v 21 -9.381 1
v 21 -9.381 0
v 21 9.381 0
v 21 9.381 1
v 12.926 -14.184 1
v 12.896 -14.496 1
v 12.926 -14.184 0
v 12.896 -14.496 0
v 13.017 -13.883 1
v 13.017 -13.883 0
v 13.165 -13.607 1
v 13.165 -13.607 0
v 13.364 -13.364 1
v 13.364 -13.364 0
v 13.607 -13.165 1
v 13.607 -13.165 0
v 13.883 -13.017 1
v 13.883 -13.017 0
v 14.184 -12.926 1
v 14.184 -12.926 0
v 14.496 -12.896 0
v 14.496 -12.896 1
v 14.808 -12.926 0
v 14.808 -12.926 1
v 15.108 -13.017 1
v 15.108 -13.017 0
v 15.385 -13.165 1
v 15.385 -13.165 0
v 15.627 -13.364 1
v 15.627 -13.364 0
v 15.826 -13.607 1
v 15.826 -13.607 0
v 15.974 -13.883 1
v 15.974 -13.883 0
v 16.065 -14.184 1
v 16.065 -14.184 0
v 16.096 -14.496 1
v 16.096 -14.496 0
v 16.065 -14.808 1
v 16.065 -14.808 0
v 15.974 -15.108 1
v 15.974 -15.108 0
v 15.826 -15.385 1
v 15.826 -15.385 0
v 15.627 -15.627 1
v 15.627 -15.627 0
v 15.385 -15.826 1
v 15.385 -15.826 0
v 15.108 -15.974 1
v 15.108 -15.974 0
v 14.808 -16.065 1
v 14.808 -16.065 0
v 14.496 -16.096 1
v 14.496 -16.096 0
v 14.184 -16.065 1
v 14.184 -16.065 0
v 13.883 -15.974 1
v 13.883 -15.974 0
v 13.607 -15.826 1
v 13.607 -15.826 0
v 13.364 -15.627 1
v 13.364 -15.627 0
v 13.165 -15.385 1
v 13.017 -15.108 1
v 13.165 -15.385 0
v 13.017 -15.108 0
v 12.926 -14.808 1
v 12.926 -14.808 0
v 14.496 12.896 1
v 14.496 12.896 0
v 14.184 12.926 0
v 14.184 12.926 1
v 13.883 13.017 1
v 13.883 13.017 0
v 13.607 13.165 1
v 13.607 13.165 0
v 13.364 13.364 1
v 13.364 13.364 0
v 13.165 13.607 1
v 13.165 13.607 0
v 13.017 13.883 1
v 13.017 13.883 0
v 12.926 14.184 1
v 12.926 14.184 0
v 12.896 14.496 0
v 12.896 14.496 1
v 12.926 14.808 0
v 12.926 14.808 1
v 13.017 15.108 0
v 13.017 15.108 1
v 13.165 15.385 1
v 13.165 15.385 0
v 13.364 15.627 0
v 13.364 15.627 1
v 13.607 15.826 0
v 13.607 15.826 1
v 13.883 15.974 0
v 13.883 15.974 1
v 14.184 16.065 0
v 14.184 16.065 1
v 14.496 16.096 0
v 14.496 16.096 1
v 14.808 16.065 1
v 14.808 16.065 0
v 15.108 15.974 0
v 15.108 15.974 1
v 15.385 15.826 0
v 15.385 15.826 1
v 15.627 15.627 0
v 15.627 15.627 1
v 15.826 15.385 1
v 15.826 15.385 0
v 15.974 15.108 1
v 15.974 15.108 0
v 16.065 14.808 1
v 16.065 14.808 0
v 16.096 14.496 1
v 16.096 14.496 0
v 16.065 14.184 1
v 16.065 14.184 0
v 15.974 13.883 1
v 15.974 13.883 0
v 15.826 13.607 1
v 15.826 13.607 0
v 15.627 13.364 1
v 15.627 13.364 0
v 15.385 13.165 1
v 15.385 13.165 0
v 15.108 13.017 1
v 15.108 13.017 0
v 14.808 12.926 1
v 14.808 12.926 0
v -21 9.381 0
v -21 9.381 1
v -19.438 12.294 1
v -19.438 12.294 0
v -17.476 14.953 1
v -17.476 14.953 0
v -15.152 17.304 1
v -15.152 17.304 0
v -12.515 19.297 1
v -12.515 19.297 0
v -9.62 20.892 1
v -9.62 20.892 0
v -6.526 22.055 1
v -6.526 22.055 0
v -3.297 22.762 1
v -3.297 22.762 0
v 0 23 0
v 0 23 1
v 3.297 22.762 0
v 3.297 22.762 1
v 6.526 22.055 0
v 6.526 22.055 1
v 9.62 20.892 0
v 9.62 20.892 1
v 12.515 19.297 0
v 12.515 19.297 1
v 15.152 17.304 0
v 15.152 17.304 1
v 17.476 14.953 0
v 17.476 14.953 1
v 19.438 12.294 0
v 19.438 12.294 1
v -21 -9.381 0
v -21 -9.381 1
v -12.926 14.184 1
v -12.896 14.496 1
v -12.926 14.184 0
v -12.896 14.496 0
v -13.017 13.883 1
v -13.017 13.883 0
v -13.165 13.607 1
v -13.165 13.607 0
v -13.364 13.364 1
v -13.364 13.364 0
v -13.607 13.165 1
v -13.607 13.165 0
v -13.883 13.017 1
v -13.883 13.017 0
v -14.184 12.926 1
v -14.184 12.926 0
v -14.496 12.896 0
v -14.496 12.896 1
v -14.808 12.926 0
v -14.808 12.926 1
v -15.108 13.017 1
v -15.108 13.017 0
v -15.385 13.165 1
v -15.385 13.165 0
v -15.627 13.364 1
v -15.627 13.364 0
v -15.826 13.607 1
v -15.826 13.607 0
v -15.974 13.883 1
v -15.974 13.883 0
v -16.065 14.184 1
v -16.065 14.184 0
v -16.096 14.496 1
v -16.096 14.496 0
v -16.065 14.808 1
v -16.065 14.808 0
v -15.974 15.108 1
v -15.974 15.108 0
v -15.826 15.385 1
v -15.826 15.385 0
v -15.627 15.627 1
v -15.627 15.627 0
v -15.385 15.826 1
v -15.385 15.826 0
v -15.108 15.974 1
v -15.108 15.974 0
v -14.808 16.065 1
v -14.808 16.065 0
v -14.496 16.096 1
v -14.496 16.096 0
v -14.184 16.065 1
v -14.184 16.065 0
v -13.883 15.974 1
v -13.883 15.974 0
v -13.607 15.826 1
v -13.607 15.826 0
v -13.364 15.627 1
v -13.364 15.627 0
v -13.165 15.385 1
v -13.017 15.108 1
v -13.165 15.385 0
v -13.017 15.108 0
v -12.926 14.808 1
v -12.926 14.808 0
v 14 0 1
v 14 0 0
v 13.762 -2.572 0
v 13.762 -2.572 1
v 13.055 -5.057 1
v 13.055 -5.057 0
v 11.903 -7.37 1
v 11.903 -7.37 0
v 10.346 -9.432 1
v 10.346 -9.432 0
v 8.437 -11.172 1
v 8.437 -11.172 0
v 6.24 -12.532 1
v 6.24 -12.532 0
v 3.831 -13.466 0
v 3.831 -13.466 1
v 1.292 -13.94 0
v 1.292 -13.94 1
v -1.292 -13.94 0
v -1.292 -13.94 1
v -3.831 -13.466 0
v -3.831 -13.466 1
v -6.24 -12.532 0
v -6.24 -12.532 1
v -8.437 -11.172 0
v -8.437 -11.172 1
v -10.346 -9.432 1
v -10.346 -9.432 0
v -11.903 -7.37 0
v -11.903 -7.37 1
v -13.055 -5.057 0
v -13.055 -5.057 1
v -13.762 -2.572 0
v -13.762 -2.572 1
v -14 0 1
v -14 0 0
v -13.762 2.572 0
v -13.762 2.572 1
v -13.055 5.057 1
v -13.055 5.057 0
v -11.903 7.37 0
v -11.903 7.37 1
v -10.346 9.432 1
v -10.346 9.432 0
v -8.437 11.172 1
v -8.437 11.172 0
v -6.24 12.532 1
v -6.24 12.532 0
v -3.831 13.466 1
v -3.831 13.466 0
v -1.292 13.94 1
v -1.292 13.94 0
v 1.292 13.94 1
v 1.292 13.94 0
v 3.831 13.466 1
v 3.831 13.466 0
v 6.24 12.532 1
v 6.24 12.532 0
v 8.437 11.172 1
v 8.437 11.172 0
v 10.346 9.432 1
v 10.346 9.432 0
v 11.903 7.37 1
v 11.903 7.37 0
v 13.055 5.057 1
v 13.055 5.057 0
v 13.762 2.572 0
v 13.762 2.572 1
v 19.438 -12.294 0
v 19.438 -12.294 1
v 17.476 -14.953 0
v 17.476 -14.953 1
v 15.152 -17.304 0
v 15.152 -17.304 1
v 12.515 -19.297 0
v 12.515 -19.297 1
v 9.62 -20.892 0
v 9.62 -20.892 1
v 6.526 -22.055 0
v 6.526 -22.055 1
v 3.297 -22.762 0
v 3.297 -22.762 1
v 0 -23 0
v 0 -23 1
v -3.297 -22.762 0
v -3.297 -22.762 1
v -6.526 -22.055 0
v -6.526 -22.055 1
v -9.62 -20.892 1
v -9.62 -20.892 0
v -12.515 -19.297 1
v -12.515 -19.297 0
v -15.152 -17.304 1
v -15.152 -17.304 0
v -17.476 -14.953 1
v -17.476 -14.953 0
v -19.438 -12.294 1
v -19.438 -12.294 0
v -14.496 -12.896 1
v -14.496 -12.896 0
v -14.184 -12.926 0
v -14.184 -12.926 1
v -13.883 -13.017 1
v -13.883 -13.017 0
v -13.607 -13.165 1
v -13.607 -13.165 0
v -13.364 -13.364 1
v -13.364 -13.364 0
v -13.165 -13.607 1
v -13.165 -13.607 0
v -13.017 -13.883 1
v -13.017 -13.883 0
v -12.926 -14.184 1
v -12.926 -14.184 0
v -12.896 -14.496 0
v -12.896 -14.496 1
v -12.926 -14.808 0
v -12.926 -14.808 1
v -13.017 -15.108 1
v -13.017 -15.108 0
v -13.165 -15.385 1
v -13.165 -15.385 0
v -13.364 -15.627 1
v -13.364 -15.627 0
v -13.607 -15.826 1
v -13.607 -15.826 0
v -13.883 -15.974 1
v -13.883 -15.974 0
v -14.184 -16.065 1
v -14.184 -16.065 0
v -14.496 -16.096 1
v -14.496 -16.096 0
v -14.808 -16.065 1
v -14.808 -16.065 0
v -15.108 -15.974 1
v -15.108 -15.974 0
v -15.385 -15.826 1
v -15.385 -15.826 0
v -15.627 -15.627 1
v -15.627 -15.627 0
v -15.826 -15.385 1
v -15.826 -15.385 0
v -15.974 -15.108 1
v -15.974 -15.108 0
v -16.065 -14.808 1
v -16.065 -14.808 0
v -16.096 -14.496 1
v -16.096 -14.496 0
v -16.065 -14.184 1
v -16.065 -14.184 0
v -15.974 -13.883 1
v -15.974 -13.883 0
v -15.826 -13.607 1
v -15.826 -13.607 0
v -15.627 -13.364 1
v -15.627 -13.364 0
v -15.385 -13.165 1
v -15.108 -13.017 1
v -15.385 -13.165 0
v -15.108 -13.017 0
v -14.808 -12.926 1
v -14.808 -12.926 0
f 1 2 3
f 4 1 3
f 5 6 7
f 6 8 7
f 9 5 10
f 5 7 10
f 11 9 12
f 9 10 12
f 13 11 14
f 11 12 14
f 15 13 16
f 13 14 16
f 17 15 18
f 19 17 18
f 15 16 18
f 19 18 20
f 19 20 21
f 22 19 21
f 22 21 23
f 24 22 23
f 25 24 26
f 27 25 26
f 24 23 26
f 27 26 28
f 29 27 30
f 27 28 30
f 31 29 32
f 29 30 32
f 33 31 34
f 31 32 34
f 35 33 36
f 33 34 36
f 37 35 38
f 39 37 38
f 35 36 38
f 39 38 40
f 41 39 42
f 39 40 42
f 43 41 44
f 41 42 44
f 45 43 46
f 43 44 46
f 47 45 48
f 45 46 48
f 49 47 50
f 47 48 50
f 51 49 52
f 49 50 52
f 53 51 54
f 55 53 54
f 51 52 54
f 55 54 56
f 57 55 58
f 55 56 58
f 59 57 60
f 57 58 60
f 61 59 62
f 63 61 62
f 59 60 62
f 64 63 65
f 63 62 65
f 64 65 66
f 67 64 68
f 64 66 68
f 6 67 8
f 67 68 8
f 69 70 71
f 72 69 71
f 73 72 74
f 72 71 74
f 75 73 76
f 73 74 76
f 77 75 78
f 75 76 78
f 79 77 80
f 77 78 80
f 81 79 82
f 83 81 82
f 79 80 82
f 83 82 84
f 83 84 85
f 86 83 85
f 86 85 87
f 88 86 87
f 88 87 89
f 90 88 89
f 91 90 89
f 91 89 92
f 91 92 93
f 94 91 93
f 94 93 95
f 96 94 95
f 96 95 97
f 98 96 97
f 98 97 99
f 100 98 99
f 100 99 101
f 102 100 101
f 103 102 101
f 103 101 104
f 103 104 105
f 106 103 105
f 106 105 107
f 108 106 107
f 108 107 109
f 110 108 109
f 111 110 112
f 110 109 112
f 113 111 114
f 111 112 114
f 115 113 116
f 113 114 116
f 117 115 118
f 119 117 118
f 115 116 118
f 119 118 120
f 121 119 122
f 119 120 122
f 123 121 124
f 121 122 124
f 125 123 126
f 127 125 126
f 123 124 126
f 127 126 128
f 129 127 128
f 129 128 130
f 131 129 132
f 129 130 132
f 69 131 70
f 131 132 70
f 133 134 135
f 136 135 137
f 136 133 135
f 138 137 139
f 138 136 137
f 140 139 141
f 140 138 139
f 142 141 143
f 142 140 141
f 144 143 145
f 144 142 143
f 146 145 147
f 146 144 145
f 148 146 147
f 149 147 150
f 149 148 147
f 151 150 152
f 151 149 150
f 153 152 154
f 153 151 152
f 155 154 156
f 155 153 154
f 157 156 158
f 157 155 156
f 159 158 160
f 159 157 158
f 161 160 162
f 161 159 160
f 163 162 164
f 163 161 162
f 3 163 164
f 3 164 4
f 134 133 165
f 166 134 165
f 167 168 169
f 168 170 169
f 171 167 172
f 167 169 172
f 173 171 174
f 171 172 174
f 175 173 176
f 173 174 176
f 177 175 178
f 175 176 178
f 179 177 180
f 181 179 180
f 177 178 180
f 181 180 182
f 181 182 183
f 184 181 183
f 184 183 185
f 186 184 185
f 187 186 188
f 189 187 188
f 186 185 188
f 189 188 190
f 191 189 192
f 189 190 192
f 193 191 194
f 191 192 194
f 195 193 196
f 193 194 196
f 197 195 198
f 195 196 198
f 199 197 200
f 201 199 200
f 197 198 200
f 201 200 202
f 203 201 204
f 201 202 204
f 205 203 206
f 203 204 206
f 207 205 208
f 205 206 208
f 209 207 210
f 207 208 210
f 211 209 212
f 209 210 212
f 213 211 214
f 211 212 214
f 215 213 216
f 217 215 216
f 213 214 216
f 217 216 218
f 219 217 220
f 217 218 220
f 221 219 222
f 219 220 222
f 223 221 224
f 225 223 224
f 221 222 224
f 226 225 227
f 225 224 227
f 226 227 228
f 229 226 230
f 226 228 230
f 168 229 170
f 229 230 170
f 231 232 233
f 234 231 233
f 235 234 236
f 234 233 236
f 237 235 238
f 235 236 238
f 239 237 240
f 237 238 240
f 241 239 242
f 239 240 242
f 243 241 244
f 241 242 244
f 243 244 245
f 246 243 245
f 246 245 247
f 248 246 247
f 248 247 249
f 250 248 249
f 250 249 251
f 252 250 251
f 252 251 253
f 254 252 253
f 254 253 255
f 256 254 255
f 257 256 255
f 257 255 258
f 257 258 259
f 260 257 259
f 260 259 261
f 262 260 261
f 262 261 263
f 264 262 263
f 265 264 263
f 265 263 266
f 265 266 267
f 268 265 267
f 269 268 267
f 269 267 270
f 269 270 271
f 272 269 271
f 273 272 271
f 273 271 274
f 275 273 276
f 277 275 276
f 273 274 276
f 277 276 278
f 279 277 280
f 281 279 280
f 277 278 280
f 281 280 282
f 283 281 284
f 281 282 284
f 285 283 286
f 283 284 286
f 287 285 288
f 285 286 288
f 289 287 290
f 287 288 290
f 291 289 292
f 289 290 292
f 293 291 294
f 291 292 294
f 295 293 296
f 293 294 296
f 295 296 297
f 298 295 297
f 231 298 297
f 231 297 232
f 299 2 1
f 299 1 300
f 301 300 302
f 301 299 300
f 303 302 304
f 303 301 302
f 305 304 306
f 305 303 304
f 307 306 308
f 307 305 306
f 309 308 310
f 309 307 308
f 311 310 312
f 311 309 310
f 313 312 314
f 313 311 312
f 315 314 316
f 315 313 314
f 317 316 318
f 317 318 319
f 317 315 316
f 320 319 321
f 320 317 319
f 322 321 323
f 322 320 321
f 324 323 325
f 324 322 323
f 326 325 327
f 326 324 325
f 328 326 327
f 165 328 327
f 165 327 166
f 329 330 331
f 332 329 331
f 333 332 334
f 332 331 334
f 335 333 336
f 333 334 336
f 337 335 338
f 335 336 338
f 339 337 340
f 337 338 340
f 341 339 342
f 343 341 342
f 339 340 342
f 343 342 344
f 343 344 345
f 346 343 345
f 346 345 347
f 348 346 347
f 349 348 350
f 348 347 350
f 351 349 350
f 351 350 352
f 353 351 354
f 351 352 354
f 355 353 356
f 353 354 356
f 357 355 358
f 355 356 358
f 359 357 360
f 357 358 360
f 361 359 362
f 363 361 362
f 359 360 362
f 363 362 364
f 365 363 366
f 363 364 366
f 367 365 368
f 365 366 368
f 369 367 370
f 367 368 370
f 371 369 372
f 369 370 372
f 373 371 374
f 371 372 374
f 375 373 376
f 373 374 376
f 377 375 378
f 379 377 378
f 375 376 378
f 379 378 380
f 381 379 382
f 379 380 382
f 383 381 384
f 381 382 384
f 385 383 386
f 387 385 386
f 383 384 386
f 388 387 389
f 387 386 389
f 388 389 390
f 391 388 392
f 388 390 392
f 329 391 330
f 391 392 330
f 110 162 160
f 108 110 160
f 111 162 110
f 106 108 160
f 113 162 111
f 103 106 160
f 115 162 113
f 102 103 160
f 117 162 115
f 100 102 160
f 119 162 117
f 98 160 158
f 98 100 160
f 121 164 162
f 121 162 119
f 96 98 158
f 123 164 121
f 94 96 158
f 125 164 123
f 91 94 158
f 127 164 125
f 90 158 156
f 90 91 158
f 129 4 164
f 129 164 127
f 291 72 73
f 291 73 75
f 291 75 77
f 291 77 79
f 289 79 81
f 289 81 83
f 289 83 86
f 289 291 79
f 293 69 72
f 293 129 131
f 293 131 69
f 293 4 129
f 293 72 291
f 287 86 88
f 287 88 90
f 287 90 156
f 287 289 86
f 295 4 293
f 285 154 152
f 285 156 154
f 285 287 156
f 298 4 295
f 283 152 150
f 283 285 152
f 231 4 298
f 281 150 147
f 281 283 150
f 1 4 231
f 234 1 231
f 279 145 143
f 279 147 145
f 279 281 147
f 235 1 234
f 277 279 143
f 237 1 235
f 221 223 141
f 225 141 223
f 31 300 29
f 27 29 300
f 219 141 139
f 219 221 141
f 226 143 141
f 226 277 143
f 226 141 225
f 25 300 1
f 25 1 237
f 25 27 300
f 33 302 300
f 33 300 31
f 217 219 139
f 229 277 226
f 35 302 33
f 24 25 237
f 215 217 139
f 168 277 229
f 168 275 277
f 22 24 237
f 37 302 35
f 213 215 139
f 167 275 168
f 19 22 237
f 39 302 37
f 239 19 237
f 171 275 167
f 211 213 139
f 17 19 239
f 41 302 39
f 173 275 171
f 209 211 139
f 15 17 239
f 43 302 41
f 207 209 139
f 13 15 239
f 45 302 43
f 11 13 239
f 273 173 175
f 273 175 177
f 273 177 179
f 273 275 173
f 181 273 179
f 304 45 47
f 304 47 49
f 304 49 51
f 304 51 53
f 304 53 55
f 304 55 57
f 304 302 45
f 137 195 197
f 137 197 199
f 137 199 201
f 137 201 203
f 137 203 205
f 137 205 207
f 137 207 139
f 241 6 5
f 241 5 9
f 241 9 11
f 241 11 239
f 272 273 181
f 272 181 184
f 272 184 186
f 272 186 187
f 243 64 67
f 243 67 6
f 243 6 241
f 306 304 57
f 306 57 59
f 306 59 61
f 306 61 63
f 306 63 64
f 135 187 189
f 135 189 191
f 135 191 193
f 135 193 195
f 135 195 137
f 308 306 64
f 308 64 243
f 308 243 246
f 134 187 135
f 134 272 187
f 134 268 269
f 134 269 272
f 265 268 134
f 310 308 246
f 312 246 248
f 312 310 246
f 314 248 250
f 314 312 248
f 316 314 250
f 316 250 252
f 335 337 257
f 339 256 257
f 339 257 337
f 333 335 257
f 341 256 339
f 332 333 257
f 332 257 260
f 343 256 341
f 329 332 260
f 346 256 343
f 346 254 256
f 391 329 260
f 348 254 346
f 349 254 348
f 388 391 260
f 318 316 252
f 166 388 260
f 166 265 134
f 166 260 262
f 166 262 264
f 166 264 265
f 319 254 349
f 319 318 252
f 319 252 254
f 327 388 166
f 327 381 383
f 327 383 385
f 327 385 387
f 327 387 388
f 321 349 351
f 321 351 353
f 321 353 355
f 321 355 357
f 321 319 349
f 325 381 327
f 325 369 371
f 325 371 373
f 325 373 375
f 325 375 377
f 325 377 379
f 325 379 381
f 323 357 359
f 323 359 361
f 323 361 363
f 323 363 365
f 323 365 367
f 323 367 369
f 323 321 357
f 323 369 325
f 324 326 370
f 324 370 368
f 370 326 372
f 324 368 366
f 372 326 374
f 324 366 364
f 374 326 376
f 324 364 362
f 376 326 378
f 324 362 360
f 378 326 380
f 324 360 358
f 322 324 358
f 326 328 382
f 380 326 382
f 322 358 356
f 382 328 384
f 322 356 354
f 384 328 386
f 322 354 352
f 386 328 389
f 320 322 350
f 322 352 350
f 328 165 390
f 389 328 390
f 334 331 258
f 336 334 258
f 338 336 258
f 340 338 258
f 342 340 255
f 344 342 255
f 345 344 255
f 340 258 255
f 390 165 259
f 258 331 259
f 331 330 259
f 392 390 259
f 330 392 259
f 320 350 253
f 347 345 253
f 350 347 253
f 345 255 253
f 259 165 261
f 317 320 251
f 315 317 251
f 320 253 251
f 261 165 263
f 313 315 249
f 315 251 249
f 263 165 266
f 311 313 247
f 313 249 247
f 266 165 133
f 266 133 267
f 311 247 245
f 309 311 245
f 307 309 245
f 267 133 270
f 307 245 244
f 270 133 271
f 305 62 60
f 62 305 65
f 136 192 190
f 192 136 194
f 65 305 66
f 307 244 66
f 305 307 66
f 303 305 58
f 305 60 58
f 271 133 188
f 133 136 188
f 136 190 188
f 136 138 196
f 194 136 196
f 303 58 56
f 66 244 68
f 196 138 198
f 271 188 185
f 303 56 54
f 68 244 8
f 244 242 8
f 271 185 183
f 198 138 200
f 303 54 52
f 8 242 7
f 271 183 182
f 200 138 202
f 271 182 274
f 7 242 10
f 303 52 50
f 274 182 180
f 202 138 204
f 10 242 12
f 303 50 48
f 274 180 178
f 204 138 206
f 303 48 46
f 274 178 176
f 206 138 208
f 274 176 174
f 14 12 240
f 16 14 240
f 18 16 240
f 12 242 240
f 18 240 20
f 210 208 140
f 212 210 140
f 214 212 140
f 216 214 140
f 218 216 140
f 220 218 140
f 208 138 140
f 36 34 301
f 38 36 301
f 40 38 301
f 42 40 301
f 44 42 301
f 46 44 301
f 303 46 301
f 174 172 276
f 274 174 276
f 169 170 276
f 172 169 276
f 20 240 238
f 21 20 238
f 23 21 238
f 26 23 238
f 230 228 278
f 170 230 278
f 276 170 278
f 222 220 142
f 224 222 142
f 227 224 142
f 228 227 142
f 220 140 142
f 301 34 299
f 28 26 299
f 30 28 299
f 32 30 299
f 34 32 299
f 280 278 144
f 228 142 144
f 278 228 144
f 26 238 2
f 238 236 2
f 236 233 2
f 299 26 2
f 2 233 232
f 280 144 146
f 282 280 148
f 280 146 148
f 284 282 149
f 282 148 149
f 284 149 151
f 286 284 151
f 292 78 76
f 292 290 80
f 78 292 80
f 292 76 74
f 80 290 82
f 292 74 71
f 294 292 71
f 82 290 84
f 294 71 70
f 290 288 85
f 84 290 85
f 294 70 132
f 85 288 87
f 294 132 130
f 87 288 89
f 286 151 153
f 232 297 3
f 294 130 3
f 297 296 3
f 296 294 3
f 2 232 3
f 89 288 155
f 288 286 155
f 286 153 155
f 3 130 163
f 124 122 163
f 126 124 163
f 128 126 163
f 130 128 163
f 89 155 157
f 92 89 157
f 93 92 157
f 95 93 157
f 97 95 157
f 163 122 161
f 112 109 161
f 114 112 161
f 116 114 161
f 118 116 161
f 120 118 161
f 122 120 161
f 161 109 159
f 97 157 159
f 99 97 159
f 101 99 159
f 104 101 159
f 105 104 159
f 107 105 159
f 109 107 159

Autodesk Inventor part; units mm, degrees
ref_plane "YZ Plane" through (0, 0, 0) normal (1, 0, 0) x (0, 1, 0)
ref_plane "XZ Plane" through (0, 0, 0) normal (0, 1, 0) x (-1, 0, 0)
sketch "Sketch1" plane through (0, 0, 0) normal (0, 0, 1) x (1, 0, 0)
  circle A0 centre (0, 0) radius 14
  circle A1 centre (0, 0) radius 23
  dimension "d0" = 28
  dimension "d1" = 46
extrude "Extrusion1" add sketch "Sketch1" along normal blind 10
sketch "Sketch2" plane through (0, 0, 10) normal (0, 0, 1) x (1, 0, 0)
  line L0 (0, 0) -> (23, 0) construction
  circle A0 centre (0, 0) radius 23 projected
  circle A1 centre (0, 0) radius 20.5 construction
  line L1 (0, 0) -> (14.4957, 14.4957) construction
  dimension "d35" = 41
  dimension "d34" = 45
hole "For-m3-screws" at (14.4957, 14.4957, 10) direction (0, 0, -1) diameter 3.2 end through all counterbore diameter 7 counterbore depth 8.5
fillet "Fillet3" radius 0.5 2 edges at (14.3283, 17.9917, 5.75) (17.9917, 14.3283, 5.75)
pattern_circular "Circular Pattern1" count 4 over 360 about axis through (0, 0, 0) along (0, 0, 1) of "For-m3-screws", "Fillet3"
sketch "Sketch3" plane through (0, 0, 0) normal (0, 1, 0) x (-1, 0, 0)
  line L0 (23, 3.8135) -> (-23, 1)
  line L1 (-23, 1) -> (-23, 11)
  line L2 (23, 10) -> (-27, 10) projected
  line L3 (-23, 11) -> (23, 11)
  line L4 (23, 11) -> (23, 3.8135)
  line L5 (-23, 0) -> (-23, 10) projected
  line L6 (23, 0) -> (23, 10) projected
  line L7 (-14, 0) -> (14, 0) projected
  line L8 (-27, 10) -> (-23, 10) projected
  point P0 (0, 0)
  point P1 (-14.3283, 10)
  point P2 (0, 11)
  point P3 (-17.9917, 10)
  dimension "d14" = 3.5
  dimension "d15" = 1
  dimension "d16" = 1
extrude "Angled-cut" [suppressed]
sketch "Sketch6" plane through (0, 0, 0) normal (0, 1, 0) x (-1, 0, 0)
  line L0 (23, 10) -> (-23, 10)
  line L1 (-23, 10) -> (-23, 1)
  line L2 (-23, 1) -> (23, 1)
  line L3 (23, 1) -> (23, 10)
  line L4 (23, 0) -> (-23, 0) projected
  line L5 (23, 0) -> (23, 10) projected
  line L6 (-23, 0) -> (-23, 10) projected
  point P0 (0, 0)
  point P1 (0, 10)
  dimension "d27" = 1
extrude "Straight-cut" cut sketch "Sketch6" along normal through all both and the other way through all contours L3 L2 L1 L0
sketch "Sketch4" plane through (0, 0, 0) normal (0, 0, 1) x (1, 0, 0)
  line L0 (21, 30) -> (26, 30)
  line L1 (26, 30) -> (26, -30)
  line L2 (26, -30) -> (21, -30)
  line L3 (21, -30) -> (21, 30)
  point P0 (0, 0)
  point P1 (26, 0)
  dimension "d19" = 21
  dimension "d20" = 60
  dimension "d21" = 5
extrude "Extrusion3" cut sketch "Sketch4" along normal blind 10
mirror "Mirror1" about plane through (0, 0, 0) normal (1, 0, 0) of "Extrusion3"
ref_plane "Work Plane1" through (22, -12.0416, 0) normal (1, 0, 0) x (0, 0, -1)
sketch "Sketch8" plane through (22, -12.0416, 0) normal (1, 0, 0) x (0, 0, -1)
  line L0 (-0.5, 21.0416) -> (-0.5, 3.0416) construction
  line L1 (-1, 2.6608) -> (-1, 21.4224) projected
  line L2 (0, 21.4224) -> (0, 2.6608) projected
  line L3 (0, 12.0416) -> (-1, 12.0416) construction
  point P0 (-0.5, 12.0416)
  dimension "d41" = 18
hole "Hole2" [suppressed]
chamfer "Chamfer1" [suppressed]
thread "Thread2" size "M2x0.4" class "6H" standard "ANSI Metric M Profile" full length
thread "Thread3" size "M2x0.4" class "6H" standard "ANSI Metric M Profile" full length
thread "Thread4" size "M2x0.4" class "6H" standard "ANSI Metric M Profile" full length
thread "Thread5" size "M2x0.4" class "6H" standard "ANSI Metric M Profile" full length
equation "\"d0\" = innerdiameter"
equation "\"d1\" = outerdiameter"
equation "\"d35\" = holepositiondiameter"
equation "\"d19\" = trimspan"
equation "\"outerdiameter\" = 46"
equation "\"innerdiameter\" = 28"
equation "\"holepositiondiameter\" = 41"
equation "\"trimspan\" = 21"
properties part number "probe-gate-spacer-quartz-holder" material "Stainless Steel"
